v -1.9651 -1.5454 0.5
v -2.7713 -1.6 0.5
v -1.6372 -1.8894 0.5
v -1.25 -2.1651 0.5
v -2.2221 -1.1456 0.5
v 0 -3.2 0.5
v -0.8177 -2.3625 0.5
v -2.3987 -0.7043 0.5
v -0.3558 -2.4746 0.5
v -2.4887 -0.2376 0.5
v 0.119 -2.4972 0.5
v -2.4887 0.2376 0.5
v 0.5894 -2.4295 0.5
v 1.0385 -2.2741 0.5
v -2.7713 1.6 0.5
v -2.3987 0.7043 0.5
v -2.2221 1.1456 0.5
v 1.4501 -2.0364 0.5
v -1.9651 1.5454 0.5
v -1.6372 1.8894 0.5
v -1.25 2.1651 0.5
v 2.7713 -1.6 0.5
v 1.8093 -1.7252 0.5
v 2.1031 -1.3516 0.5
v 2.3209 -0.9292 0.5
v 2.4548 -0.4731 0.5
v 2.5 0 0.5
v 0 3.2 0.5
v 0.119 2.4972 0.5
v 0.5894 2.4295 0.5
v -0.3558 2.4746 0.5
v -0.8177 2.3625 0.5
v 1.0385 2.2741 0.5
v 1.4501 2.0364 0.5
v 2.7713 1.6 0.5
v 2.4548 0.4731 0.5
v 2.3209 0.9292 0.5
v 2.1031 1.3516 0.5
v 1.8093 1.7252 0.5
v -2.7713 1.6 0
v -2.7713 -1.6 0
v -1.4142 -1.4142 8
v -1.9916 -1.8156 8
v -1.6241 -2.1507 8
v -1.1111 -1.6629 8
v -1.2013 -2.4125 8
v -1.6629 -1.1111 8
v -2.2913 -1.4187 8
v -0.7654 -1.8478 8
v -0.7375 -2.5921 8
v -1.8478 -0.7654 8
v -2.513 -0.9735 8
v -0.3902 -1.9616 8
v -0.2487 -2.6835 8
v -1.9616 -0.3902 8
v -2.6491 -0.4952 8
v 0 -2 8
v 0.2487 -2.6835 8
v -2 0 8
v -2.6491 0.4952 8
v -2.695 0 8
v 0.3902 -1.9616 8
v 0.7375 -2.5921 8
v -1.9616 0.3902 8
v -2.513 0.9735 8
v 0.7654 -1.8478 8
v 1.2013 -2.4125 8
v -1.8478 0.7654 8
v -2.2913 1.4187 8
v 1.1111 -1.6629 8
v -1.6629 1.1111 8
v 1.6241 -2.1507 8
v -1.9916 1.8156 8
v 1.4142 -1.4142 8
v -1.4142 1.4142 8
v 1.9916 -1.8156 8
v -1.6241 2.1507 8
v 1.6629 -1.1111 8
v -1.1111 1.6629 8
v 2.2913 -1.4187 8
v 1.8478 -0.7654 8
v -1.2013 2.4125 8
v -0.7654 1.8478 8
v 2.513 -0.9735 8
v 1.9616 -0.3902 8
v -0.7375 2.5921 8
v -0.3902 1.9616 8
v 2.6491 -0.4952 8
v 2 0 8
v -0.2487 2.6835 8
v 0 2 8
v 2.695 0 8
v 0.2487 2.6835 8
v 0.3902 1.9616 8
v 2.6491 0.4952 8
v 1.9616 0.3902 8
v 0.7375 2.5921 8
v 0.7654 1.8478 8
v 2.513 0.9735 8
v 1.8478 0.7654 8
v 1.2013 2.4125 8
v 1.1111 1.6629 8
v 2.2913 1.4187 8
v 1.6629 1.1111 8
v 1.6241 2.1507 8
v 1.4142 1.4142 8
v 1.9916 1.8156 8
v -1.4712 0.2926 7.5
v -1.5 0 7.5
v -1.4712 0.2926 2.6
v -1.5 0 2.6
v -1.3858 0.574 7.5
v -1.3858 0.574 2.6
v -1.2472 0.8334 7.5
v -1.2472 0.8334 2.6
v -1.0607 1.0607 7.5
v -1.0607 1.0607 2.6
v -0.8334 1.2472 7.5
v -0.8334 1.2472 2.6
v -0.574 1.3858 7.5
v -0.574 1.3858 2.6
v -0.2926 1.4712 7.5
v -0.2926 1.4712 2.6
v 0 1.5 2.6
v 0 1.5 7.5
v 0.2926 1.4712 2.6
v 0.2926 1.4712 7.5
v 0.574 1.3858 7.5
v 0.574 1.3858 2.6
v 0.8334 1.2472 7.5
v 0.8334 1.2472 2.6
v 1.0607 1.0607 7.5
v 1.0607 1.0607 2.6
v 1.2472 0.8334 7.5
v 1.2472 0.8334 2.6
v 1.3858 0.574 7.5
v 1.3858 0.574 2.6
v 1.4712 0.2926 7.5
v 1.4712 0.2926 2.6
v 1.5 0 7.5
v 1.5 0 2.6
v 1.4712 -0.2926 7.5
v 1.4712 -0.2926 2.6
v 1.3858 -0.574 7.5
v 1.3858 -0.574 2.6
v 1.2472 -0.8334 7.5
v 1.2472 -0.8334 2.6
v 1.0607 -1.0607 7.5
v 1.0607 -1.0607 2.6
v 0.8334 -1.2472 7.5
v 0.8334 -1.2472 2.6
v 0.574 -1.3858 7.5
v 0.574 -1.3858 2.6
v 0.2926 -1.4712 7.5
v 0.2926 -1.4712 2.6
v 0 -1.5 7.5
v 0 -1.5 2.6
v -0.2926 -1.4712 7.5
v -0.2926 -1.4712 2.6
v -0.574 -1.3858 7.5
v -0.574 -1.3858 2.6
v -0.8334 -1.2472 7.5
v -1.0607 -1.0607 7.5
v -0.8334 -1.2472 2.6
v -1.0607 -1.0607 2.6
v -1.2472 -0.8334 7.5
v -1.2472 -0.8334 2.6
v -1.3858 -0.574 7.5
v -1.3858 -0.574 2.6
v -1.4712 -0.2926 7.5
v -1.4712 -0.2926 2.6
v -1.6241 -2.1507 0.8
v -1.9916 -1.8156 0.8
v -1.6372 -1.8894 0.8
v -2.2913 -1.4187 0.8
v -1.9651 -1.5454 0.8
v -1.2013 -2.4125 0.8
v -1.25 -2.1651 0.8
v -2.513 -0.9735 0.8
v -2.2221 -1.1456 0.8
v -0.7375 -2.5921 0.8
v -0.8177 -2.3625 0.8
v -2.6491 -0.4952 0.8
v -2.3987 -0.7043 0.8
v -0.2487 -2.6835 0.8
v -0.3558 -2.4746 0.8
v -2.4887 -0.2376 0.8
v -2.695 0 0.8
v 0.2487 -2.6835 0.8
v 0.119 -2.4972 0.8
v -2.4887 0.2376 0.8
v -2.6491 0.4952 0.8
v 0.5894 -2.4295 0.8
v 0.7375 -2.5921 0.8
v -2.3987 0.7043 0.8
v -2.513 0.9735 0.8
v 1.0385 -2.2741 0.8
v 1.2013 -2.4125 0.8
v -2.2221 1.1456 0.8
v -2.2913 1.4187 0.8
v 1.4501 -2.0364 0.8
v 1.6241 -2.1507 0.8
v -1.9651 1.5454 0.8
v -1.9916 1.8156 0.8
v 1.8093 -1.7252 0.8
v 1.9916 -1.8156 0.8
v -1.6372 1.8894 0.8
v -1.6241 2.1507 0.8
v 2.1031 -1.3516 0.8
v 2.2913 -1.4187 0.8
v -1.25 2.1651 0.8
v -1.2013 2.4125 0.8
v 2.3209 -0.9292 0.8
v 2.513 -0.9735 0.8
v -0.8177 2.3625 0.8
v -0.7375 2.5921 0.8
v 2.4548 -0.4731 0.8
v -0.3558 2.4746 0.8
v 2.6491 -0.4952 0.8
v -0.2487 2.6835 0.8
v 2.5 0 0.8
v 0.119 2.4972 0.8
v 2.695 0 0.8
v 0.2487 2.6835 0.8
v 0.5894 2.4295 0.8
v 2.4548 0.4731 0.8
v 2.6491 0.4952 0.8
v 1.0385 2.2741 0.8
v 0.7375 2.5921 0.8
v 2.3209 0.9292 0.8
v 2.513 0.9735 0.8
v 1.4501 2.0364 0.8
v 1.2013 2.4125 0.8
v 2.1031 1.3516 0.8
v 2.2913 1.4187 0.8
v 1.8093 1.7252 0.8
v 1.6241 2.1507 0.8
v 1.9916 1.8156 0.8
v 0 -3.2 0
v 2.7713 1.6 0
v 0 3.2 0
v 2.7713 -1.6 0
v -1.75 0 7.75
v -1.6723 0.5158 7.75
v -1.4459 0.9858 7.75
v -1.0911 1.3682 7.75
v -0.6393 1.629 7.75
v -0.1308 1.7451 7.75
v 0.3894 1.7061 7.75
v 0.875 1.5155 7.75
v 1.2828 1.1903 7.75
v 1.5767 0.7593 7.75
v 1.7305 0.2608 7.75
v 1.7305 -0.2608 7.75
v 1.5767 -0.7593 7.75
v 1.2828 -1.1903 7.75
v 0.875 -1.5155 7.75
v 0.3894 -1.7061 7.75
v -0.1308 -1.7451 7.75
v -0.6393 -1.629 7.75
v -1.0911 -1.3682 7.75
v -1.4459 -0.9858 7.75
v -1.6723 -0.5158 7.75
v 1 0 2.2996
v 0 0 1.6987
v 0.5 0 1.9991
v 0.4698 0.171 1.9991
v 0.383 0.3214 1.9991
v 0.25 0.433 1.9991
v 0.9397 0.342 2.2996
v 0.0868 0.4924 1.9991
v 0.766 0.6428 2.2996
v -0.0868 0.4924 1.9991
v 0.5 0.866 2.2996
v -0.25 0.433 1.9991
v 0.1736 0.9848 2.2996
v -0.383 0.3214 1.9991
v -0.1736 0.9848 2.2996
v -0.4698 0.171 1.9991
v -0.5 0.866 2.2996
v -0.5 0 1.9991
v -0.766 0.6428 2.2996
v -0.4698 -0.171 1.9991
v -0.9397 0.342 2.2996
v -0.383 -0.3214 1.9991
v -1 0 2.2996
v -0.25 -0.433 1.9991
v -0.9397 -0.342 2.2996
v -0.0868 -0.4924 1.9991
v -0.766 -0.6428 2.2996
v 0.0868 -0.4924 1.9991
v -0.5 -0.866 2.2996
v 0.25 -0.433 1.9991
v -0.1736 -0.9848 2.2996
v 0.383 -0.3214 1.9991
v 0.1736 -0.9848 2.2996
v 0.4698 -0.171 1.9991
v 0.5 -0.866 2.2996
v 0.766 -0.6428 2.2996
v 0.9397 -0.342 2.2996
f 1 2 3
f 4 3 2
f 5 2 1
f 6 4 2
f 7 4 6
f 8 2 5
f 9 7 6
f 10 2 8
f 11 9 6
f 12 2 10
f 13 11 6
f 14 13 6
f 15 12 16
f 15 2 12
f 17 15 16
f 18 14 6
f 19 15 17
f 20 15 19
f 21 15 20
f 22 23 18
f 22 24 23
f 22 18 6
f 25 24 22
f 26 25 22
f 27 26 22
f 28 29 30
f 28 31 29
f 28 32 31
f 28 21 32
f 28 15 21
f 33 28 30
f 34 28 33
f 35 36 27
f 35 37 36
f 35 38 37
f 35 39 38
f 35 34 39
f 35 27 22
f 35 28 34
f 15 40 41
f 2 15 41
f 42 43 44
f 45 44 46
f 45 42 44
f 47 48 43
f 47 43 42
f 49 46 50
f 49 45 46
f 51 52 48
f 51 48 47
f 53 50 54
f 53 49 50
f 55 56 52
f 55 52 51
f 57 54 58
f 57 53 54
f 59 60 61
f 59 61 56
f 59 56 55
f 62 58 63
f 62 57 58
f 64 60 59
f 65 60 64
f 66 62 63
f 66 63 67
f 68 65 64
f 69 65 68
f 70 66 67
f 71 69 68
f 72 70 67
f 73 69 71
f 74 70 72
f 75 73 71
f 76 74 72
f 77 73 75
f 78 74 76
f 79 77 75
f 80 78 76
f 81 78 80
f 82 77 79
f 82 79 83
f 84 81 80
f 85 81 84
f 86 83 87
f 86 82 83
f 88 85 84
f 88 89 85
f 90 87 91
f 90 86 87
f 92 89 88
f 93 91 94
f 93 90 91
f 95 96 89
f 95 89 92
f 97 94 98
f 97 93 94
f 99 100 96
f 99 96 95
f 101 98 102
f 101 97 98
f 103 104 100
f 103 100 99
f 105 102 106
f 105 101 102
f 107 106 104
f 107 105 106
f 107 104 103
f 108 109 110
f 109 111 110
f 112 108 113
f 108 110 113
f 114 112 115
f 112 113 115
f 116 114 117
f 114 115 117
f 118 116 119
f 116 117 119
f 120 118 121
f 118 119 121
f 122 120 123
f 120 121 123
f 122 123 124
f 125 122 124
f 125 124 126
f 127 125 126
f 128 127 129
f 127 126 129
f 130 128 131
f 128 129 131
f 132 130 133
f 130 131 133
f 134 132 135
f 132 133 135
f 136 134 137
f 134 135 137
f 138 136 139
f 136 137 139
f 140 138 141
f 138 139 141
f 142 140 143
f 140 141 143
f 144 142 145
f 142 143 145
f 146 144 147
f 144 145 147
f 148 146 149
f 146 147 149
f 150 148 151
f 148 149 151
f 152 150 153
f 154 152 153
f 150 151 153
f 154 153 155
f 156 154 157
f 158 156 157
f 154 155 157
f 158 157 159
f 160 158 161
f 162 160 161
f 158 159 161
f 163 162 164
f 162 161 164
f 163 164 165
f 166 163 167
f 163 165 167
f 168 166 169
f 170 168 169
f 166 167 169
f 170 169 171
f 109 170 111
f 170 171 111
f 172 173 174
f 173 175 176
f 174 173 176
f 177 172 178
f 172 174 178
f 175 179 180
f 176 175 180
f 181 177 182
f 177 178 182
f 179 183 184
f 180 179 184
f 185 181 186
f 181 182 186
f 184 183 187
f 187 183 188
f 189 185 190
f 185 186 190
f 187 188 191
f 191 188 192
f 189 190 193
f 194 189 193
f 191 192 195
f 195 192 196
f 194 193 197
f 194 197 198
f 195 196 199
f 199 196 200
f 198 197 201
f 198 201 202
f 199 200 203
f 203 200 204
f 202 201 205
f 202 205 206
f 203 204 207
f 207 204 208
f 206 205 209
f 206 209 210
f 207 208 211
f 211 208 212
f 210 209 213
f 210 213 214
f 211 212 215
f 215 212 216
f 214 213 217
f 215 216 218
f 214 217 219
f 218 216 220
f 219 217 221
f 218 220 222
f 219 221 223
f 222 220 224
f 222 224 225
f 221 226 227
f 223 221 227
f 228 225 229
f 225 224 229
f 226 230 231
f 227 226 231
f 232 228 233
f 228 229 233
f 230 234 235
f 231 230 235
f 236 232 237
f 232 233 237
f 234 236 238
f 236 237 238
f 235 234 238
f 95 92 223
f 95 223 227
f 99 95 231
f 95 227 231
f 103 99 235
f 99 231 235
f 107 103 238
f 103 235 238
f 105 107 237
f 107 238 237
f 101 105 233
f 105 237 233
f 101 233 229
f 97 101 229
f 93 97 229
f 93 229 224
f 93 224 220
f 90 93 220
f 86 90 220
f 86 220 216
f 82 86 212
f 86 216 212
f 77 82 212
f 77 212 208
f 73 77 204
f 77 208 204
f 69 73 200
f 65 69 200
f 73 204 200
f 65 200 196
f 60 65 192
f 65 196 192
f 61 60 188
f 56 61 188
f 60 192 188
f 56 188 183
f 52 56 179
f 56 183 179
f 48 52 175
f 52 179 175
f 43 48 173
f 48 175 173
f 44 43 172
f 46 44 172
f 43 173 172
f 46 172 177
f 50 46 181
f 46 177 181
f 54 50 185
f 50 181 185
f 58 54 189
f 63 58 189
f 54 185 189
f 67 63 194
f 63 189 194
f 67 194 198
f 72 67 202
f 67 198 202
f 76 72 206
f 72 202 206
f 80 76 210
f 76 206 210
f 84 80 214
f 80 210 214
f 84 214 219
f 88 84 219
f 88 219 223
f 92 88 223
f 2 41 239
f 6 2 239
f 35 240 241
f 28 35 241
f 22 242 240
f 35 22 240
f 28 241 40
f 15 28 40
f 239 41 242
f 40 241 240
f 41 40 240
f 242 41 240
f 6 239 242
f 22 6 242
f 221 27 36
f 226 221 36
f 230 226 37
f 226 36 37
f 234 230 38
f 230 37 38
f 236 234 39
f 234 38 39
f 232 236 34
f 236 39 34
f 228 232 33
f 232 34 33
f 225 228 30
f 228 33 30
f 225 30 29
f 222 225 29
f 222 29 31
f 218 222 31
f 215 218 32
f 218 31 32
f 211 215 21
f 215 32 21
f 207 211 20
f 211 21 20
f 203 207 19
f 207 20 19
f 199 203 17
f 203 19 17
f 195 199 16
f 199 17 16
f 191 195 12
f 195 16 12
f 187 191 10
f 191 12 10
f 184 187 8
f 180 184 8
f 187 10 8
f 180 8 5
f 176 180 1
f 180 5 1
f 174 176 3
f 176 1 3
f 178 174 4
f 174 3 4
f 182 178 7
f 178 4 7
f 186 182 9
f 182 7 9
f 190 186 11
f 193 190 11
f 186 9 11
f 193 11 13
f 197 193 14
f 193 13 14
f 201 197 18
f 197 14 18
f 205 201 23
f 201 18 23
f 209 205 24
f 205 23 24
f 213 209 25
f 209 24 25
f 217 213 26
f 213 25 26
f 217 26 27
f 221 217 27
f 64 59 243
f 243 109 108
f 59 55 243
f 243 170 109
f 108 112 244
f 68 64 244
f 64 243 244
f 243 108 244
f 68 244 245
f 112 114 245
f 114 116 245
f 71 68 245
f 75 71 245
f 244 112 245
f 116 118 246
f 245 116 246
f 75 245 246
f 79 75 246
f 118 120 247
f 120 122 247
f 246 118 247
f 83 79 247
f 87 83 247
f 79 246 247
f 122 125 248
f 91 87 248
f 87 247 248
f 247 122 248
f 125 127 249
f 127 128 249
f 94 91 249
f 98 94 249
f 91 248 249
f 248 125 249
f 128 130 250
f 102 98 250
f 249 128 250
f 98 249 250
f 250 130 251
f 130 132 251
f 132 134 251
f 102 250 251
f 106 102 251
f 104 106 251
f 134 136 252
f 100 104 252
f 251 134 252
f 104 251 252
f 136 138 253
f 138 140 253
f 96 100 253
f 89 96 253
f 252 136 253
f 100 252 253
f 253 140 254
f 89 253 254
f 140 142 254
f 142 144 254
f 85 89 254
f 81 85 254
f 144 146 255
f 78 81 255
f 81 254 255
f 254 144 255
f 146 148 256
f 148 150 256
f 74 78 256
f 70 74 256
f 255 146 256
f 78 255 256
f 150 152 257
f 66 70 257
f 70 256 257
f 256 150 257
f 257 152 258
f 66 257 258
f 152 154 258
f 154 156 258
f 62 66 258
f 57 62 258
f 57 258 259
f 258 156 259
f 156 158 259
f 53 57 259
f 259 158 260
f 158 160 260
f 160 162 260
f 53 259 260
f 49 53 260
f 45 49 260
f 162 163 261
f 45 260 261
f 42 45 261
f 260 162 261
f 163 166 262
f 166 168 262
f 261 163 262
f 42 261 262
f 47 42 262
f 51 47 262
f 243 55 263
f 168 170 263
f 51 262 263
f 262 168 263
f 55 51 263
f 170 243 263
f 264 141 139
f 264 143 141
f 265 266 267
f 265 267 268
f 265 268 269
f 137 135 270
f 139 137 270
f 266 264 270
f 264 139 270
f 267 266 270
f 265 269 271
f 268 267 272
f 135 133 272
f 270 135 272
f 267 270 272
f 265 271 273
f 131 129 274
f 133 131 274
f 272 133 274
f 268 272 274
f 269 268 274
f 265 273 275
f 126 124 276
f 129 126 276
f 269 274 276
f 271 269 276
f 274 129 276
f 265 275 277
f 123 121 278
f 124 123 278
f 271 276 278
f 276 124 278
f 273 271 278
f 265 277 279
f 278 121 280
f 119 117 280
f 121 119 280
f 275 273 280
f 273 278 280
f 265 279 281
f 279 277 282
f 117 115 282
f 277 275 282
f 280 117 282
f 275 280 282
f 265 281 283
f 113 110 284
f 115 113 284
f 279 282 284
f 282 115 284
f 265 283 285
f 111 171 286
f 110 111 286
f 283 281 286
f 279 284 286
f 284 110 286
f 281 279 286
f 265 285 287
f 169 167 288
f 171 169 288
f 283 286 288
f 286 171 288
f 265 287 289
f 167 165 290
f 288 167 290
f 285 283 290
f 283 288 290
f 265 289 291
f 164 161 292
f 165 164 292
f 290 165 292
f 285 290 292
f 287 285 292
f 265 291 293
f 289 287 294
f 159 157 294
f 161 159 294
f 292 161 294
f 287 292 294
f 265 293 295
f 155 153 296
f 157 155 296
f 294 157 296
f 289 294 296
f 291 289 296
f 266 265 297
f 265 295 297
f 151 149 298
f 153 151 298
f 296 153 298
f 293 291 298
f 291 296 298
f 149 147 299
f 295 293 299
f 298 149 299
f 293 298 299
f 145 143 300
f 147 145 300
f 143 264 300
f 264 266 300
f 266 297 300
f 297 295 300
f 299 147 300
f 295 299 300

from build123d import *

# Parameters (mm, degrees)
F1_DEPTH       = 0.5
F2_R           = 2.5
F3_DEPTH       = 0.3
F4_R           = 2.695
F5_DEPTH       = 7.2
F7_D           = 3
F7_DEPTH       = 5.4
F7_CSINK_D     = 4
F7_CSINK_ANGLE = 90
F7_TIP         = 0.9012909285


with BuildPart() as f1:
    # F0 (on Top) → F1 (new body)
    with BuildSketch(Plane.XY):
        Polygon((-2.7712812921, -1.6), (0, -3.2), (2.7712812921, -1.6), (2.7712812921, 1.6), (0, 3.2), (-2.7712812921, 1.6), align=None)
    extrude(amount=F1_DEPTH)

    # F2 (on face) → F3 (join)
    with BuildSketch(Plane.XY.offset(0.5)):
        Circle(F2_R)
    extrude(amount=F3_DEPTH)

    # F4 (on face) → F5 (join)
    with BuildSketch(Plane.XY.offset(0.8)):
        Circle(F4_R)
    extrude(amount=F5_DEPTH)

    # F7
    with Locations(Plane.XY.offset(8)):
        with Locations((0, 0)):
            CounterSinkHole(F7_D / 2, F7_CSINK_D / 2, depth=F7_DEPTH, counter_sink_angle=F7_CSINK_ANGLE)
            with Locations((0, 0, -(F7_DEPTH + F7_TIP / 2))):  # 118° drill point
                Cone(0, F7_D / 2, F7_TIP, mode=Mode.SUBTRACT)


solid = f1.part
